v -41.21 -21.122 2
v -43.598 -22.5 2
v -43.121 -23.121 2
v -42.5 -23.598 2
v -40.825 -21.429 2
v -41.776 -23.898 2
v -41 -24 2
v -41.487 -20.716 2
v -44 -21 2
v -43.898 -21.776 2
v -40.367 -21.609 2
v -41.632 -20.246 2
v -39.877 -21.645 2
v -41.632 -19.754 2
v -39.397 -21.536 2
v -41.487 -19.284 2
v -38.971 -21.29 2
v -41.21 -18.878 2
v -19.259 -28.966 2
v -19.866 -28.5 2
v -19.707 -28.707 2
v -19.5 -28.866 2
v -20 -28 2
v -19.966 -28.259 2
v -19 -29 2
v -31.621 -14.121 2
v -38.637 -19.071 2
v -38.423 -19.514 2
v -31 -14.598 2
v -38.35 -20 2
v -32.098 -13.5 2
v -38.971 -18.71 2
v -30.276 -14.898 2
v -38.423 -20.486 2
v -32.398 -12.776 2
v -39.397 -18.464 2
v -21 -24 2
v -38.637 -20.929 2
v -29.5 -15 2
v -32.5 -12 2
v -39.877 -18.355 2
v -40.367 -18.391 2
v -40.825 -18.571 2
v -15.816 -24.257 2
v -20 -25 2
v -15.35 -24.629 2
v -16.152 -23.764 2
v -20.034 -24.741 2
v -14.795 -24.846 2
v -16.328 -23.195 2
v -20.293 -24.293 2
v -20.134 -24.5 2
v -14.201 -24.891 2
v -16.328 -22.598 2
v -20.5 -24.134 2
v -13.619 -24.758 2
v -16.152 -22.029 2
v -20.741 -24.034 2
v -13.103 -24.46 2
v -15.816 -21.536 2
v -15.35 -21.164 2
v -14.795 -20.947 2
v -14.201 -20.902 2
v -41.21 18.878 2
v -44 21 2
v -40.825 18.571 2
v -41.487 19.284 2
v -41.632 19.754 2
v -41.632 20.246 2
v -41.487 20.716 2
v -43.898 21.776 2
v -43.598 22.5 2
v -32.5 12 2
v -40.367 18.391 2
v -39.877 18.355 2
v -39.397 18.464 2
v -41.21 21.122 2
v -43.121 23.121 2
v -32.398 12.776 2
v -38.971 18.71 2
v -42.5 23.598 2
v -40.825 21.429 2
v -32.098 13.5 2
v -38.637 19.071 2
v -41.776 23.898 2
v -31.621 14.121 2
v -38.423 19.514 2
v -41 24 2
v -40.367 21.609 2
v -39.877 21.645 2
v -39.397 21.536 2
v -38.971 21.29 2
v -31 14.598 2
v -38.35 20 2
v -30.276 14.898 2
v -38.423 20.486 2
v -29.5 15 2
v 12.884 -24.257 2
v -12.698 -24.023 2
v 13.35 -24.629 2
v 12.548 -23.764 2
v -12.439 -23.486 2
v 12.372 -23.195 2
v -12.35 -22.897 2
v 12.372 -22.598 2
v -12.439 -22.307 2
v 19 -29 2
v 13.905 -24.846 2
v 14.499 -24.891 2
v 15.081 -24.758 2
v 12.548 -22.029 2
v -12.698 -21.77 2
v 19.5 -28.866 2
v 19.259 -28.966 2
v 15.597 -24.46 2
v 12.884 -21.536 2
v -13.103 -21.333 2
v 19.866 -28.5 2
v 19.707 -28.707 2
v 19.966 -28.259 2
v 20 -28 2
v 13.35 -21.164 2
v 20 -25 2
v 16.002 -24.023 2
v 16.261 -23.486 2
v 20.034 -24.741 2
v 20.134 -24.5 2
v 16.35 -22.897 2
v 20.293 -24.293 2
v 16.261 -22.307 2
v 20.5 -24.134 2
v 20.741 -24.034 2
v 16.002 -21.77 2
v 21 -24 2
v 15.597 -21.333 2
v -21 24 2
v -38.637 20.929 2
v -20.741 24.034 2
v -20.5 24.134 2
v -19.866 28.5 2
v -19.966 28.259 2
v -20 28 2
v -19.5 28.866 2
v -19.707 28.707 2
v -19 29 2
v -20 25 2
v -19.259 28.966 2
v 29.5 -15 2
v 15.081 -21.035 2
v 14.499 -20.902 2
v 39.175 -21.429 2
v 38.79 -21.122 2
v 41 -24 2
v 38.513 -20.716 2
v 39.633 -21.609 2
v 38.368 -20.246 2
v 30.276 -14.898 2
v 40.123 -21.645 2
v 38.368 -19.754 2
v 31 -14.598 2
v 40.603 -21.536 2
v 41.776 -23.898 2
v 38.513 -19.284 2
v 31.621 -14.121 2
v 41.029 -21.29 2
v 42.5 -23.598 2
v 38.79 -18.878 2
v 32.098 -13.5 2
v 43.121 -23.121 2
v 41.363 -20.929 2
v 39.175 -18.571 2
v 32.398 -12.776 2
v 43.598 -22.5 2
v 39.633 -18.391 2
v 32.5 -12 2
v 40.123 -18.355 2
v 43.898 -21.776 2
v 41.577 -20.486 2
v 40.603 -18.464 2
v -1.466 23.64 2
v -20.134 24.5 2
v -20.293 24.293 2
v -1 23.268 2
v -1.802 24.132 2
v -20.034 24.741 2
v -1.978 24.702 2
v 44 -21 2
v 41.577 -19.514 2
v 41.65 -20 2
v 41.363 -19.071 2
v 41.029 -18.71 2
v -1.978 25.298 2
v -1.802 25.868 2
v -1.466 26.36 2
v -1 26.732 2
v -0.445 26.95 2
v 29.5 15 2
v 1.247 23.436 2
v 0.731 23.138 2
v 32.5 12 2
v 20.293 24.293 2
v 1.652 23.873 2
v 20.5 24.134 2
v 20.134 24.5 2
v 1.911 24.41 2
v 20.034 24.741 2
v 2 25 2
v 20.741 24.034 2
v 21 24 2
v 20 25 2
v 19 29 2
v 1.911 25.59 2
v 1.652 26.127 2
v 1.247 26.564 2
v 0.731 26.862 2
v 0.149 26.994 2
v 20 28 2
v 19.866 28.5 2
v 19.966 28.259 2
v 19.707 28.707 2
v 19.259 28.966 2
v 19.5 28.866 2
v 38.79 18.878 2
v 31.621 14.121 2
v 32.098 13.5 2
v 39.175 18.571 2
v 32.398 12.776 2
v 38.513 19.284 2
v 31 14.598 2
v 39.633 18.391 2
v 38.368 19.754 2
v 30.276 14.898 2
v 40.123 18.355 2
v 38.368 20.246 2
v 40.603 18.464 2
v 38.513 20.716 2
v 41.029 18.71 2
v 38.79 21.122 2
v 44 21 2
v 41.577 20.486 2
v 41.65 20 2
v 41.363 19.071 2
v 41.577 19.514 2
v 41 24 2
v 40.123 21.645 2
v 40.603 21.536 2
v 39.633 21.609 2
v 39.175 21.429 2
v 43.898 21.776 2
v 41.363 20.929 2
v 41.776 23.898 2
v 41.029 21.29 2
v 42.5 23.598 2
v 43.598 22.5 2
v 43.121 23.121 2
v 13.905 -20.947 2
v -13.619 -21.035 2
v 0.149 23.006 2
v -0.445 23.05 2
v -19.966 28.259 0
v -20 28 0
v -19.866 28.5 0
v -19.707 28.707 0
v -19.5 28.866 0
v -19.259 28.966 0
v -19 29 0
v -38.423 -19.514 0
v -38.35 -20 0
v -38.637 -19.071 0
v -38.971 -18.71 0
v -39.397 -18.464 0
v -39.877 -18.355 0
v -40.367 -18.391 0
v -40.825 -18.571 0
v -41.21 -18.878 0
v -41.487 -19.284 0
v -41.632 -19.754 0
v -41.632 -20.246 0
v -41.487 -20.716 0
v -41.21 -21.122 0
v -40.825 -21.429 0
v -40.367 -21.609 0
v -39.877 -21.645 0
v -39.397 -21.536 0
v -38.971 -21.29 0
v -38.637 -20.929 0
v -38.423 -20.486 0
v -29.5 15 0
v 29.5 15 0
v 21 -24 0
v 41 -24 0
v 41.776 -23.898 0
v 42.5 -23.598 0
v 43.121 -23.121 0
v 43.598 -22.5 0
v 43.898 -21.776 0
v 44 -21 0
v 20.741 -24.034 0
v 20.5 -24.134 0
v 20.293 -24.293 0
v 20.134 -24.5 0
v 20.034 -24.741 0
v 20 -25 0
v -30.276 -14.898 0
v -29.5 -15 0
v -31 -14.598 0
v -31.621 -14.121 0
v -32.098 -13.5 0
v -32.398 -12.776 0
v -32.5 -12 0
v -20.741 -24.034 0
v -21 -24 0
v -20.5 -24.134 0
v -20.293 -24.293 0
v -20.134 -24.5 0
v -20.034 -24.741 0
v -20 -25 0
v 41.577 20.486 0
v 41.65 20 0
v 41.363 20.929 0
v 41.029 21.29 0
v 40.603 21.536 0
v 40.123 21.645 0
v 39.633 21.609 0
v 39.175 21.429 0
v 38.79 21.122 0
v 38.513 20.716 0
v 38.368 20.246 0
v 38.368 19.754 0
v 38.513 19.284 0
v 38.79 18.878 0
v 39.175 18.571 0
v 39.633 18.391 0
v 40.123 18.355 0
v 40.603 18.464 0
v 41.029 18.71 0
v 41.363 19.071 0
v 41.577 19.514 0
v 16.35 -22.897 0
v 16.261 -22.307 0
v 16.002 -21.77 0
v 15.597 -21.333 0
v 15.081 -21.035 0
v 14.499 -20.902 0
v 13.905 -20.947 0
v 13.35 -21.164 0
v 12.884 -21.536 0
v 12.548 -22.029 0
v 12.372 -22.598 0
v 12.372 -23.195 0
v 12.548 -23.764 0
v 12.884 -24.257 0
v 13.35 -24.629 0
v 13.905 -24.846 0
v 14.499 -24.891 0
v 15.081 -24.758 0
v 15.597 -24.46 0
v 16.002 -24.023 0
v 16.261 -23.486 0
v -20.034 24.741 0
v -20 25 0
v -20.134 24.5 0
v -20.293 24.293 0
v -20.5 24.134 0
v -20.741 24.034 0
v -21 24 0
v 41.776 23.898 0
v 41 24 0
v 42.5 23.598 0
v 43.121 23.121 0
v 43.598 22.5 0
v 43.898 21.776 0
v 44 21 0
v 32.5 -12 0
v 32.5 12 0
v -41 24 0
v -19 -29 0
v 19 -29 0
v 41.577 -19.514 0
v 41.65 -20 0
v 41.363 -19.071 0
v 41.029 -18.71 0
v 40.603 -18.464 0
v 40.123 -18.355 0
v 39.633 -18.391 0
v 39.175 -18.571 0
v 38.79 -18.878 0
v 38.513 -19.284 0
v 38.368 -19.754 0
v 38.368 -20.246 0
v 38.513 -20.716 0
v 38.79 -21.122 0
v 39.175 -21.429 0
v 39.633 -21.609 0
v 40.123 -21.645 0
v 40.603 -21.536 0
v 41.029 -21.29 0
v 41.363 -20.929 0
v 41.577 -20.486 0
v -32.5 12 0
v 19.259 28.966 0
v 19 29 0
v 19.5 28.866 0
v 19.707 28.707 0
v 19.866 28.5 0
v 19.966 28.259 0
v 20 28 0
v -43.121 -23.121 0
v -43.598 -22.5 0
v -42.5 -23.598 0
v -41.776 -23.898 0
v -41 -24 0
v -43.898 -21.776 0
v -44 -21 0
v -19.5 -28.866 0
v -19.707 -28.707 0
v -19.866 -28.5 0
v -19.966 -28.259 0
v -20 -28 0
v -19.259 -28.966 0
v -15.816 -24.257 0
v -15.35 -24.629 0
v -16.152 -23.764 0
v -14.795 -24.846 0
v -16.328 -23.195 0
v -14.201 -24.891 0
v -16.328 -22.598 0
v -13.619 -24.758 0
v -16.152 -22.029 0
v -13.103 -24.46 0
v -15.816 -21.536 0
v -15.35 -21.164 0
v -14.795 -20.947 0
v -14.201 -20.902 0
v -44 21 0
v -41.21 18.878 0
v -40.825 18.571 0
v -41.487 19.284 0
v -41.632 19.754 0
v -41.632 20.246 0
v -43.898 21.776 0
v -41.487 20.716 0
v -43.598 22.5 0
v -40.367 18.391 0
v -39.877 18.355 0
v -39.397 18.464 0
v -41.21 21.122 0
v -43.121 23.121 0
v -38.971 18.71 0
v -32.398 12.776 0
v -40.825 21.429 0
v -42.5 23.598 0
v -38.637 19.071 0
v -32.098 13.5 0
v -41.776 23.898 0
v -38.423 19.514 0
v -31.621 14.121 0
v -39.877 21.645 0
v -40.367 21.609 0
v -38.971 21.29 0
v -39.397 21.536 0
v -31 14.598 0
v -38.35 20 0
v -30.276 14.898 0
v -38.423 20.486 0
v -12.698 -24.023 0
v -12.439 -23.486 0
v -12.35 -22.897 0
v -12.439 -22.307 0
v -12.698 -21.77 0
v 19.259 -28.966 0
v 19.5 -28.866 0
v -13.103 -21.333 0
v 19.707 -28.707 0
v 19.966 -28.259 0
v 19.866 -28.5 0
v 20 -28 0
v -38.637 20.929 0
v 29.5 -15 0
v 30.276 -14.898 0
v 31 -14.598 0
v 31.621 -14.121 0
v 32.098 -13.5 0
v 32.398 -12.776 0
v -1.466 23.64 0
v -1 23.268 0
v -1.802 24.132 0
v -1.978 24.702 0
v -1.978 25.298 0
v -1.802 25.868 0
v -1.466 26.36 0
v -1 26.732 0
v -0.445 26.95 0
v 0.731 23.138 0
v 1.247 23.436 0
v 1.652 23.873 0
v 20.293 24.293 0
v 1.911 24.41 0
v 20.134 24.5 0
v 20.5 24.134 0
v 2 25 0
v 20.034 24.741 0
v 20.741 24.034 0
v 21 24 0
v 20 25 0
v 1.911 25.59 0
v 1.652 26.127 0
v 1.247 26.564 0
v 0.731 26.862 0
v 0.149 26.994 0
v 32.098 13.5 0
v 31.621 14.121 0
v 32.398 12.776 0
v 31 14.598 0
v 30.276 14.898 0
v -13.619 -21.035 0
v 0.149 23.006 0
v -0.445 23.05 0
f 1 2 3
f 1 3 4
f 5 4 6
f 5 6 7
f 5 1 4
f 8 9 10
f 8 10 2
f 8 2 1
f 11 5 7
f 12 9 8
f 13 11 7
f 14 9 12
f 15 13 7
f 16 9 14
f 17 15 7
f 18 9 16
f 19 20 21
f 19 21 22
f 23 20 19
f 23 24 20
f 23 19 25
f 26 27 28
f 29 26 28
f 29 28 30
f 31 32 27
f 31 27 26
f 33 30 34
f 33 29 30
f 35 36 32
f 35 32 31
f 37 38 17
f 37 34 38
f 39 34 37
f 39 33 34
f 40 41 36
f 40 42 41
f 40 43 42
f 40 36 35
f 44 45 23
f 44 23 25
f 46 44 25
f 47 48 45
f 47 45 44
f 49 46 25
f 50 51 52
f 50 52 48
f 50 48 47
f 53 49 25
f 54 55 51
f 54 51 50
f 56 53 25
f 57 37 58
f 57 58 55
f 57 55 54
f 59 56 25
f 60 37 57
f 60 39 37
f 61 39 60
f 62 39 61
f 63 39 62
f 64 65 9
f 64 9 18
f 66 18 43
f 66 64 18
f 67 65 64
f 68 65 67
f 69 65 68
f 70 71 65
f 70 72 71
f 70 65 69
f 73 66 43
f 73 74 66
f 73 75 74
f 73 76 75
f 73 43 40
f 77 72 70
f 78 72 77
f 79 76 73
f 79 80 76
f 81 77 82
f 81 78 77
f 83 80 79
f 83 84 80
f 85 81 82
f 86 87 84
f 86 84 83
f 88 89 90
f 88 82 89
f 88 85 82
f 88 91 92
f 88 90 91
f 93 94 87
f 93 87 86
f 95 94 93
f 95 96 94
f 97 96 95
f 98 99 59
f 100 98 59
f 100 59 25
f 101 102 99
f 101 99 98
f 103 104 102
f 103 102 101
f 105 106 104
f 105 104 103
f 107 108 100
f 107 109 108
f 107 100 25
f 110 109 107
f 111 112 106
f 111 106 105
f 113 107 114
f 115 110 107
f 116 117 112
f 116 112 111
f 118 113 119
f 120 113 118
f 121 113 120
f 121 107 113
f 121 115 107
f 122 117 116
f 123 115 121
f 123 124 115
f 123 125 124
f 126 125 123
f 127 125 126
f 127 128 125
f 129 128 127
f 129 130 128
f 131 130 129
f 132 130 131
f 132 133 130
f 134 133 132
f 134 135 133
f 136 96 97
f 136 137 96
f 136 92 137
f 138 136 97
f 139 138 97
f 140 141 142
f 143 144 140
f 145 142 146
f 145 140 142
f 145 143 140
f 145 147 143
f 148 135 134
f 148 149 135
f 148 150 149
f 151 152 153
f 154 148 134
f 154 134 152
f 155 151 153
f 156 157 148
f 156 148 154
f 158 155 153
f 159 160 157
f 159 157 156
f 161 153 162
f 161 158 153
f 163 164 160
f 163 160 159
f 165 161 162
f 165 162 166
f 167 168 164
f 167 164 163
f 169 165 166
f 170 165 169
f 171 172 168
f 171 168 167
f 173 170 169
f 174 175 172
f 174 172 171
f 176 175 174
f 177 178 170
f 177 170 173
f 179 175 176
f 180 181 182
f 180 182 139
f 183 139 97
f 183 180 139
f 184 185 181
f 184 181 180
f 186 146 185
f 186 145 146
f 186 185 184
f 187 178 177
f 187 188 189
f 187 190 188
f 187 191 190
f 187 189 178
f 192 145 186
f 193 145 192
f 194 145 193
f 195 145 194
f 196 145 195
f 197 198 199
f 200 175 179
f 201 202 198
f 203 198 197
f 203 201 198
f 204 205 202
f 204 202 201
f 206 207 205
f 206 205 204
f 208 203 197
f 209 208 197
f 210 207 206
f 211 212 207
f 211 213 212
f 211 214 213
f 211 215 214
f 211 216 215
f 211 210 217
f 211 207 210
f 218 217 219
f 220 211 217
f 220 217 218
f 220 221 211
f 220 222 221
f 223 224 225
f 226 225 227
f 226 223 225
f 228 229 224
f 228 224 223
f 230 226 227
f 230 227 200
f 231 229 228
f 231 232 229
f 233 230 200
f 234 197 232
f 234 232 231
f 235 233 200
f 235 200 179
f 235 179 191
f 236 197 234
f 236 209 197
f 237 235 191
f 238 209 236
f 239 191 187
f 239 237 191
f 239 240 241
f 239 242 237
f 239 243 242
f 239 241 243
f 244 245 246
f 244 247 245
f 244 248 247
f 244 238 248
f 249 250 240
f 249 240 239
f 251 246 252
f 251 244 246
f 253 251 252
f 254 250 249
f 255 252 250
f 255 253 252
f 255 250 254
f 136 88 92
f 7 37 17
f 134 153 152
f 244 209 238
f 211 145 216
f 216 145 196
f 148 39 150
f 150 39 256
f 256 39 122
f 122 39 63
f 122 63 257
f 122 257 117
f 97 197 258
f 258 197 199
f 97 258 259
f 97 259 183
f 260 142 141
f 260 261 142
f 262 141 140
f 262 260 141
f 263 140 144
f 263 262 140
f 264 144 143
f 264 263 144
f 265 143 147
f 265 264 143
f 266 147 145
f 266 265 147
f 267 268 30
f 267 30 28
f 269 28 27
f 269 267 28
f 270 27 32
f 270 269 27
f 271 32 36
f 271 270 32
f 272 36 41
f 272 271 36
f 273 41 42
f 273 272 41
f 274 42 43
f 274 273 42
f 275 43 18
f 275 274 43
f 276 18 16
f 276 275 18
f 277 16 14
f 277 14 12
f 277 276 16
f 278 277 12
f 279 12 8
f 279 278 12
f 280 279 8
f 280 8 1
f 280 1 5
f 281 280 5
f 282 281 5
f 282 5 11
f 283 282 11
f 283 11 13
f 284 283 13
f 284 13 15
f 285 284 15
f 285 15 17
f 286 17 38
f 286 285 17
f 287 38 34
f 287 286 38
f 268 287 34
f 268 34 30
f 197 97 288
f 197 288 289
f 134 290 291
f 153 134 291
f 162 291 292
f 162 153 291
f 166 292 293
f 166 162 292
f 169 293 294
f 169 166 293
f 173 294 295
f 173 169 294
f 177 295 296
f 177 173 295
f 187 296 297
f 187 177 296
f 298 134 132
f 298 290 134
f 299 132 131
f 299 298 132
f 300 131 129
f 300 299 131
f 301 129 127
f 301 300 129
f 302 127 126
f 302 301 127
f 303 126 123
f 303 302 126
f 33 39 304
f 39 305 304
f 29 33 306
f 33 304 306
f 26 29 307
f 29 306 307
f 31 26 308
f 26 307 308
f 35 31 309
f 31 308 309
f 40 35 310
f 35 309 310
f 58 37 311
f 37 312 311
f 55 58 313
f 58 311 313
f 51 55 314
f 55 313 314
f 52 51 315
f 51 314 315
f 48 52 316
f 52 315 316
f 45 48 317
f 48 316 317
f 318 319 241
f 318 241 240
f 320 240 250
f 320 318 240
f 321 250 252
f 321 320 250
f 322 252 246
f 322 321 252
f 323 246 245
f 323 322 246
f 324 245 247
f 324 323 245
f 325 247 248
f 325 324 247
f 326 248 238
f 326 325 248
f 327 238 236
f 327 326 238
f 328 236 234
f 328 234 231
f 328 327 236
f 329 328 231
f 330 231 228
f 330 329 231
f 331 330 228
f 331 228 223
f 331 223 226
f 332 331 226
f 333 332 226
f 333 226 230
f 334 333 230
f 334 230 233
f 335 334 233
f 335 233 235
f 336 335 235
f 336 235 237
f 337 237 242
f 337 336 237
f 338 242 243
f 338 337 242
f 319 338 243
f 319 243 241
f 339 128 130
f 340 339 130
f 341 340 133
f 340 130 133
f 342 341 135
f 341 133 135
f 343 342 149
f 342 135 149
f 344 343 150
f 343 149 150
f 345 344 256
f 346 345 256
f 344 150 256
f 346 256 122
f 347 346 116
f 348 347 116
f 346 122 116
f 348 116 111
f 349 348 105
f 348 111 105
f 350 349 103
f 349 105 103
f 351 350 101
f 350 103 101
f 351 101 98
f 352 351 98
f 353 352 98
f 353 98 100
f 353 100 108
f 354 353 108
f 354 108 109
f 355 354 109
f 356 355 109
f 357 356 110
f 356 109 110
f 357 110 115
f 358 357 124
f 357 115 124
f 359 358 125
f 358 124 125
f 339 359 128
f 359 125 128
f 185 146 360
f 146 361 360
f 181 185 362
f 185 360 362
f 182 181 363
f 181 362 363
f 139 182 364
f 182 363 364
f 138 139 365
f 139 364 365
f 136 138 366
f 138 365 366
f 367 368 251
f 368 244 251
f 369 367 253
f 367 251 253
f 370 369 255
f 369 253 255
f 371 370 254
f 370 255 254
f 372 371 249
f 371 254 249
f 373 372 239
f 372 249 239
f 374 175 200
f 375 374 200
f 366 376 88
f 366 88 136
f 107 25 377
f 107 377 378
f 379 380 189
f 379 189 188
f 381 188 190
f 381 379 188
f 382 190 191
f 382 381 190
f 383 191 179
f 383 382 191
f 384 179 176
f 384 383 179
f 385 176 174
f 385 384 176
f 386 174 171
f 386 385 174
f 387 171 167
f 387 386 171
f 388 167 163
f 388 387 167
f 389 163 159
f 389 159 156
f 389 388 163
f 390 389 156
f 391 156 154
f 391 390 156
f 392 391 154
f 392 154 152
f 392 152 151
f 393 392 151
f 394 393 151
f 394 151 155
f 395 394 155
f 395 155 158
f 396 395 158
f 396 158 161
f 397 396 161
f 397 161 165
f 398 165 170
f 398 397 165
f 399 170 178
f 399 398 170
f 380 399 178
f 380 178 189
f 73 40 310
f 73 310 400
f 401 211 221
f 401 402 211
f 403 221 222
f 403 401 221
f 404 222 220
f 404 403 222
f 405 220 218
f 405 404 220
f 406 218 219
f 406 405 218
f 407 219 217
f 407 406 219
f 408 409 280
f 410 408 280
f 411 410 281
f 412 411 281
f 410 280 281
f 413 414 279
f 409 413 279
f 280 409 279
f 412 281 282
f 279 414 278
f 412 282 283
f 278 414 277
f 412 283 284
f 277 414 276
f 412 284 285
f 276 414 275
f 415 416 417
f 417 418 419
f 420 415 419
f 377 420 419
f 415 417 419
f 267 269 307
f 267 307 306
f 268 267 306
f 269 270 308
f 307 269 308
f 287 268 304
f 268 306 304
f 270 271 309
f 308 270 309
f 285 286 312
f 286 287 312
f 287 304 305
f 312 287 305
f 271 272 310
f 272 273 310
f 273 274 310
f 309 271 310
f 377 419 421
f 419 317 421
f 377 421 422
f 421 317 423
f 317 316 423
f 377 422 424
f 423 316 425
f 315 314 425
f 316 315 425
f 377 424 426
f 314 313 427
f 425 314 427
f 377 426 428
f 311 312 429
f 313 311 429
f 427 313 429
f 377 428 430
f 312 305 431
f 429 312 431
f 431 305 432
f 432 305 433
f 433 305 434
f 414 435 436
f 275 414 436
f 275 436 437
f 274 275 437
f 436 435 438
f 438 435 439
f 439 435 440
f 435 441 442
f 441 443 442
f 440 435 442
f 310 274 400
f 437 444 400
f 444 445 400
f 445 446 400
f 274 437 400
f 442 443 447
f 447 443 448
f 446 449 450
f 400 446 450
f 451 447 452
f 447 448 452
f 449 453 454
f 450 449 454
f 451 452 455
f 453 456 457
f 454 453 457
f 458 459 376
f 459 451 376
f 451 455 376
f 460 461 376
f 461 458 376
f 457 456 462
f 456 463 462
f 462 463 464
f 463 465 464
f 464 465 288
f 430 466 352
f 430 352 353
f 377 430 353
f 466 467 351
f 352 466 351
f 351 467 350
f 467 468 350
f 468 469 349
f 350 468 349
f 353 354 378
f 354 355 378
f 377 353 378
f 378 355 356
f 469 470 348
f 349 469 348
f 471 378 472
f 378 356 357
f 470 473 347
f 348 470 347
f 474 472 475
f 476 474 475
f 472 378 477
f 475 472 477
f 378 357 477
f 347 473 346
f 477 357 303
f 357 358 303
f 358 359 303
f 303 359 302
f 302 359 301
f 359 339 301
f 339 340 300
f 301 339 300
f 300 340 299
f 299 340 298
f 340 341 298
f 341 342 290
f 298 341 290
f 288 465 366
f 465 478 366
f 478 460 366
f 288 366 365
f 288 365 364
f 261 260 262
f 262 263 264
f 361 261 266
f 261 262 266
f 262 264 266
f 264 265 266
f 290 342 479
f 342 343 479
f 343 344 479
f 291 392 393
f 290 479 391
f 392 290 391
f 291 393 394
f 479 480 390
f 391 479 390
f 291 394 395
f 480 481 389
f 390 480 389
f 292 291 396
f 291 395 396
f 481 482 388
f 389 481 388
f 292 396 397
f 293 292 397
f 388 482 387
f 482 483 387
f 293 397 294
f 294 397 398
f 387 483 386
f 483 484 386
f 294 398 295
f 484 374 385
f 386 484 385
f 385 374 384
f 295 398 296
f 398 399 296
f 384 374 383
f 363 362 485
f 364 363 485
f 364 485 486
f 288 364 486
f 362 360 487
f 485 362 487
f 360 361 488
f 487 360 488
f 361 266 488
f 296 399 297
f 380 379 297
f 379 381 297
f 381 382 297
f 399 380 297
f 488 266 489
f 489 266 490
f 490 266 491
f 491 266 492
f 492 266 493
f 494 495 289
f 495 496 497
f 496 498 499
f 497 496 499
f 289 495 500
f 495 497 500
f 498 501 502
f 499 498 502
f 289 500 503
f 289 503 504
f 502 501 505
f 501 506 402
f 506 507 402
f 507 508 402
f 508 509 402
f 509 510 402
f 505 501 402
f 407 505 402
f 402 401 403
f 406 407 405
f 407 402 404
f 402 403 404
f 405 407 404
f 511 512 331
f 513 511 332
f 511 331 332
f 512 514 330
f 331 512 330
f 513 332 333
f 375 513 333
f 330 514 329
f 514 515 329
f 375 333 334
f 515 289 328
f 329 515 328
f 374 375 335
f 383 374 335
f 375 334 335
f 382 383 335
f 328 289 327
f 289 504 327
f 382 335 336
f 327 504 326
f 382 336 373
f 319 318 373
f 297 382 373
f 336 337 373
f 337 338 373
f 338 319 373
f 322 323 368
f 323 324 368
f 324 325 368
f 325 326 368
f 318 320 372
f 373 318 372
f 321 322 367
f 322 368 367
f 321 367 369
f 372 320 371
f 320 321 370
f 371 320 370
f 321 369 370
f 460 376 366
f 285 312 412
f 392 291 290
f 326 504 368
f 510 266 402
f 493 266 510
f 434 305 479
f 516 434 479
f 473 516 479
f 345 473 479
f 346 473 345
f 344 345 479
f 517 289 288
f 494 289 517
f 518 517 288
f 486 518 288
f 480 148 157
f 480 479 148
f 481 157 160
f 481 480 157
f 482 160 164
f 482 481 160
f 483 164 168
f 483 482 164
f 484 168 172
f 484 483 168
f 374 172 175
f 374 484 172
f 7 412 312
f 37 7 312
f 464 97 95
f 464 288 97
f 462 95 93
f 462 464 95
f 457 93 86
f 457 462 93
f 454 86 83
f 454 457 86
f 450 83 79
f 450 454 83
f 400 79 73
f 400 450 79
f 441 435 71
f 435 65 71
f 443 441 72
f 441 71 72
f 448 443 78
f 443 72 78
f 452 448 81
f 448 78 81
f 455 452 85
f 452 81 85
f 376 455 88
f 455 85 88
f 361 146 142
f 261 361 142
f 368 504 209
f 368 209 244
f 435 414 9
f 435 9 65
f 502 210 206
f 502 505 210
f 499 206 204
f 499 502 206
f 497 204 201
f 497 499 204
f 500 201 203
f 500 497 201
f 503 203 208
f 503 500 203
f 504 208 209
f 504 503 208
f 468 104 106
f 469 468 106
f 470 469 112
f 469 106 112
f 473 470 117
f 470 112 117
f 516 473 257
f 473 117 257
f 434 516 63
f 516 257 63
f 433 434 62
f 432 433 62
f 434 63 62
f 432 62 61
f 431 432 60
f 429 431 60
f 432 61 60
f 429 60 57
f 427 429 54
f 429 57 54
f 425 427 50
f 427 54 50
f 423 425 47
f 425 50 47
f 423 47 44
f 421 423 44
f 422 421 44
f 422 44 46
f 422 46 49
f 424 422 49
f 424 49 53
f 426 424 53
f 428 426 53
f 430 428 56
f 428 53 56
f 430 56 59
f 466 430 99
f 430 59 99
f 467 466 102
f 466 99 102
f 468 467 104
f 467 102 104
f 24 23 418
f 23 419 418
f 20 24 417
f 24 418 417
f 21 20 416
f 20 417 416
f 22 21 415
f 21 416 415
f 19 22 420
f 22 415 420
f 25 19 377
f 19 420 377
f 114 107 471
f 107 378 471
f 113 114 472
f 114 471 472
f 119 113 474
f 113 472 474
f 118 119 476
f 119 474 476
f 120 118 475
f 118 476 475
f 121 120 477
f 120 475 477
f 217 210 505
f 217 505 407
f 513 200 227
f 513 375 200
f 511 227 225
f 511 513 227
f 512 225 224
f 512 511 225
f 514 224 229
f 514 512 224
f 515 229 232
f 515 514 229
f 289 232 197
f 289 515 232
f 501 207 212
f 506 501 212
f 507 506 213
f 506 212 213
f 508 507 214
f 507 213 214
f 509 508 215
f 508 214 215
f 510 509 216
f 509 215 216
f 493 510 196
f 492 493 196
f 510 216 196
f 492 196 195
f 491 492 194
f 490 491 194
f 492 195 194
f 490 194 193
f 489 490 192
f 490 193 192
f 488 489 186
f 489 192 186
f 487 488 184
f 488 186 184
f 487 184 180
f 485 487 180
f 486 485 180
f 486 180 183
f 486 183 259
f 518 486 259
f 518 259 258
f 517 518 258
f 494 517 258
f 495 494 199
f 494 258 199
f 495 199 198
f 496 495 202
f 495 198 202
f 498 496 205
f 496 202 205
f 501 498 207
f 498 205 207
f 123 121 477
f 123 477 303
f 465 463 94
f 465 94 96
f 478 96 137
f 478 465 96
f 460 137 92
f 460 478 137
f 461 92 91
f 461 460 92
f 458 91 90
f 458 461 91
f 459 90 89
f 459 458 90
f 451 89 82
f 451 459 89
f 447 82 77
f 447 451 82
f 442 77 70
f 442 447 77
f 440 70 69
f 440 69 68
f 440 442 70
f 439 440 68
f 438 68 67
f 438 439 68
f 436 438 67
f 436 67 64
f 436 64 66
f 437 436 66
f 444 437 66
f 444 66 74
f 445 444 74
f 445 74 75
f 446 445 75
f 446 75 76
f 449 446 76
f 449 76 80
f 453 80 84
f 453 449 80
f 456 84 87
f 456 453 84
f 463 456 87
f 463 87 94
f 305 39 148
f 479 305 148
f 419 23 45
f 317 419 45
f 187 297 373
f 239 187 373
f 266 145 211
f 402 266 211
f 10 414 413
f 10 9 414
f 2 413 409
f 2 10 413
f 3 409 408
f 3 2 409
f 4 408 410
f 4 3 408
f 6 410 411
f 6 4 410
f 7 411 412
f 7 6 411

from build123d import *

# Parameters (mm, degrees)
SKETCH_1_W          = 88
SKETCH_1_H          = 48
SKETCH_1_R          = 1.65
EXTRUDE_1_DEPTH     = 2
FILLET_1_R          = 3
SKETCH_3_W          = 40
SKETCH_3_H          = 10
EXTRUDE_2_DEPTH     = 2
SKETCH_2_R          = 2
CUT_EXTRUDE_1_DEPTH = 2
SKETCH_4_W          = 65
SKETCH_4_H          = 30
CUT_EXTRUDE_2_DEPTH = 2
FILLET_2_R          = 3
FILLET_3_R          = 1


with BuildPart() as part:
    # 草图1 → 凸台-拉伸1 (new body)
    with BuildSketch(Plane.XY):
        Rectangle(SKETCH_1_W, SKETCH_1_H)
        with Locations((-40, 20)):
            Circle(SKETCH_1_R, mode=Mode.SUBTRACT)
        with Locations((40, 20)):
            Circle(SKETCH_1_R, mode=Mode.SUBTRACT)
        with Locations((40, -20)):
            Circle(SKETCH_1_R, mode=Mode.SUBTRACT)
        with Locations((-40, -20)):
            Circle(SKETCH_1_R, mode=Mode.SUBTRACT)
    extrude(amount=EXTRUDE_1_DEPTH)

    # 圆角1
    fillet_1_edges = [part.edges().sort_by_distance(p)[0] for p in [
        (-44, 24, 1),
        (44, 24, 1),
        (44, -24, 1),
        (-44, -24, 1),
    ]]
    fillet(fillet_1_edges, radius=FILLET_1_R)

    # 草图3 → 凸台-拉伸2 (add)
    with BuildSketch(Plane.XY.offset(2)):
        with Locations((0, 24)):
            Rectangle(SKETCH_3_W, SKETCH_3_H)
        with Locations((0, -24)):
            Rectangle(SKETCH_3_W, SKETCH_3_H)
    extrude(amount=-EXTRUDE_2_DEPTH)

    # 草图2 → 切除-拉伸1 (cut)
    with BuildSketch(Plane.XY.offset(2)):
        with Locations((0, 25)):
            Circle(SKETCH_2_R)
        with Locations((-14.35, -22.896529102)):
            Circle(SKETCH_2_R)
        with Locations((14.35, -22.896529102)):
            Circle(SKETCH_2_R)
    extrude(amount=-CUT_EXTRUDE_1_DEPTH, mode=Mode.SUBTRACT)

    # 草图4 → 切除-拉伸2 (cut)
    with BuildSketch(Plane.XY.offset(2)):
        Rectangle(SKETCH_4_W, SKETCH_4_H)
    extrude(amount=-CUT_EXTRUDE_2_DEPTH, mode=Mode.SUBTRACT)

    # 圆角2
    fillet_2_edges = [part.edges().sort_by_distance(p)[0] for p in [
        (-32.5, -15, 1),
        (-32.5, 15, 1),
        (32.5, 15, 1),
        (32.5, -15, 1),
    ]]
    fillet(fillet_2_edges, radius=FILLET_2_R)

    # 圆角3
    fillet_3_edges = [part.edges().sort_by_distance(p)[0] for p in [
        (20, 24, 1),
        (-20, 24, 1),
        (20, 29, 1),
        (-20, 29, 1),
        (20, -24, 1),
        (-20, -24, 1),
        (-20, -29, 1),
        (20, -29, 1),
    ]]
    fillet(fillet_3_edges, radius=FILLET_3_R)


solid = part.part
